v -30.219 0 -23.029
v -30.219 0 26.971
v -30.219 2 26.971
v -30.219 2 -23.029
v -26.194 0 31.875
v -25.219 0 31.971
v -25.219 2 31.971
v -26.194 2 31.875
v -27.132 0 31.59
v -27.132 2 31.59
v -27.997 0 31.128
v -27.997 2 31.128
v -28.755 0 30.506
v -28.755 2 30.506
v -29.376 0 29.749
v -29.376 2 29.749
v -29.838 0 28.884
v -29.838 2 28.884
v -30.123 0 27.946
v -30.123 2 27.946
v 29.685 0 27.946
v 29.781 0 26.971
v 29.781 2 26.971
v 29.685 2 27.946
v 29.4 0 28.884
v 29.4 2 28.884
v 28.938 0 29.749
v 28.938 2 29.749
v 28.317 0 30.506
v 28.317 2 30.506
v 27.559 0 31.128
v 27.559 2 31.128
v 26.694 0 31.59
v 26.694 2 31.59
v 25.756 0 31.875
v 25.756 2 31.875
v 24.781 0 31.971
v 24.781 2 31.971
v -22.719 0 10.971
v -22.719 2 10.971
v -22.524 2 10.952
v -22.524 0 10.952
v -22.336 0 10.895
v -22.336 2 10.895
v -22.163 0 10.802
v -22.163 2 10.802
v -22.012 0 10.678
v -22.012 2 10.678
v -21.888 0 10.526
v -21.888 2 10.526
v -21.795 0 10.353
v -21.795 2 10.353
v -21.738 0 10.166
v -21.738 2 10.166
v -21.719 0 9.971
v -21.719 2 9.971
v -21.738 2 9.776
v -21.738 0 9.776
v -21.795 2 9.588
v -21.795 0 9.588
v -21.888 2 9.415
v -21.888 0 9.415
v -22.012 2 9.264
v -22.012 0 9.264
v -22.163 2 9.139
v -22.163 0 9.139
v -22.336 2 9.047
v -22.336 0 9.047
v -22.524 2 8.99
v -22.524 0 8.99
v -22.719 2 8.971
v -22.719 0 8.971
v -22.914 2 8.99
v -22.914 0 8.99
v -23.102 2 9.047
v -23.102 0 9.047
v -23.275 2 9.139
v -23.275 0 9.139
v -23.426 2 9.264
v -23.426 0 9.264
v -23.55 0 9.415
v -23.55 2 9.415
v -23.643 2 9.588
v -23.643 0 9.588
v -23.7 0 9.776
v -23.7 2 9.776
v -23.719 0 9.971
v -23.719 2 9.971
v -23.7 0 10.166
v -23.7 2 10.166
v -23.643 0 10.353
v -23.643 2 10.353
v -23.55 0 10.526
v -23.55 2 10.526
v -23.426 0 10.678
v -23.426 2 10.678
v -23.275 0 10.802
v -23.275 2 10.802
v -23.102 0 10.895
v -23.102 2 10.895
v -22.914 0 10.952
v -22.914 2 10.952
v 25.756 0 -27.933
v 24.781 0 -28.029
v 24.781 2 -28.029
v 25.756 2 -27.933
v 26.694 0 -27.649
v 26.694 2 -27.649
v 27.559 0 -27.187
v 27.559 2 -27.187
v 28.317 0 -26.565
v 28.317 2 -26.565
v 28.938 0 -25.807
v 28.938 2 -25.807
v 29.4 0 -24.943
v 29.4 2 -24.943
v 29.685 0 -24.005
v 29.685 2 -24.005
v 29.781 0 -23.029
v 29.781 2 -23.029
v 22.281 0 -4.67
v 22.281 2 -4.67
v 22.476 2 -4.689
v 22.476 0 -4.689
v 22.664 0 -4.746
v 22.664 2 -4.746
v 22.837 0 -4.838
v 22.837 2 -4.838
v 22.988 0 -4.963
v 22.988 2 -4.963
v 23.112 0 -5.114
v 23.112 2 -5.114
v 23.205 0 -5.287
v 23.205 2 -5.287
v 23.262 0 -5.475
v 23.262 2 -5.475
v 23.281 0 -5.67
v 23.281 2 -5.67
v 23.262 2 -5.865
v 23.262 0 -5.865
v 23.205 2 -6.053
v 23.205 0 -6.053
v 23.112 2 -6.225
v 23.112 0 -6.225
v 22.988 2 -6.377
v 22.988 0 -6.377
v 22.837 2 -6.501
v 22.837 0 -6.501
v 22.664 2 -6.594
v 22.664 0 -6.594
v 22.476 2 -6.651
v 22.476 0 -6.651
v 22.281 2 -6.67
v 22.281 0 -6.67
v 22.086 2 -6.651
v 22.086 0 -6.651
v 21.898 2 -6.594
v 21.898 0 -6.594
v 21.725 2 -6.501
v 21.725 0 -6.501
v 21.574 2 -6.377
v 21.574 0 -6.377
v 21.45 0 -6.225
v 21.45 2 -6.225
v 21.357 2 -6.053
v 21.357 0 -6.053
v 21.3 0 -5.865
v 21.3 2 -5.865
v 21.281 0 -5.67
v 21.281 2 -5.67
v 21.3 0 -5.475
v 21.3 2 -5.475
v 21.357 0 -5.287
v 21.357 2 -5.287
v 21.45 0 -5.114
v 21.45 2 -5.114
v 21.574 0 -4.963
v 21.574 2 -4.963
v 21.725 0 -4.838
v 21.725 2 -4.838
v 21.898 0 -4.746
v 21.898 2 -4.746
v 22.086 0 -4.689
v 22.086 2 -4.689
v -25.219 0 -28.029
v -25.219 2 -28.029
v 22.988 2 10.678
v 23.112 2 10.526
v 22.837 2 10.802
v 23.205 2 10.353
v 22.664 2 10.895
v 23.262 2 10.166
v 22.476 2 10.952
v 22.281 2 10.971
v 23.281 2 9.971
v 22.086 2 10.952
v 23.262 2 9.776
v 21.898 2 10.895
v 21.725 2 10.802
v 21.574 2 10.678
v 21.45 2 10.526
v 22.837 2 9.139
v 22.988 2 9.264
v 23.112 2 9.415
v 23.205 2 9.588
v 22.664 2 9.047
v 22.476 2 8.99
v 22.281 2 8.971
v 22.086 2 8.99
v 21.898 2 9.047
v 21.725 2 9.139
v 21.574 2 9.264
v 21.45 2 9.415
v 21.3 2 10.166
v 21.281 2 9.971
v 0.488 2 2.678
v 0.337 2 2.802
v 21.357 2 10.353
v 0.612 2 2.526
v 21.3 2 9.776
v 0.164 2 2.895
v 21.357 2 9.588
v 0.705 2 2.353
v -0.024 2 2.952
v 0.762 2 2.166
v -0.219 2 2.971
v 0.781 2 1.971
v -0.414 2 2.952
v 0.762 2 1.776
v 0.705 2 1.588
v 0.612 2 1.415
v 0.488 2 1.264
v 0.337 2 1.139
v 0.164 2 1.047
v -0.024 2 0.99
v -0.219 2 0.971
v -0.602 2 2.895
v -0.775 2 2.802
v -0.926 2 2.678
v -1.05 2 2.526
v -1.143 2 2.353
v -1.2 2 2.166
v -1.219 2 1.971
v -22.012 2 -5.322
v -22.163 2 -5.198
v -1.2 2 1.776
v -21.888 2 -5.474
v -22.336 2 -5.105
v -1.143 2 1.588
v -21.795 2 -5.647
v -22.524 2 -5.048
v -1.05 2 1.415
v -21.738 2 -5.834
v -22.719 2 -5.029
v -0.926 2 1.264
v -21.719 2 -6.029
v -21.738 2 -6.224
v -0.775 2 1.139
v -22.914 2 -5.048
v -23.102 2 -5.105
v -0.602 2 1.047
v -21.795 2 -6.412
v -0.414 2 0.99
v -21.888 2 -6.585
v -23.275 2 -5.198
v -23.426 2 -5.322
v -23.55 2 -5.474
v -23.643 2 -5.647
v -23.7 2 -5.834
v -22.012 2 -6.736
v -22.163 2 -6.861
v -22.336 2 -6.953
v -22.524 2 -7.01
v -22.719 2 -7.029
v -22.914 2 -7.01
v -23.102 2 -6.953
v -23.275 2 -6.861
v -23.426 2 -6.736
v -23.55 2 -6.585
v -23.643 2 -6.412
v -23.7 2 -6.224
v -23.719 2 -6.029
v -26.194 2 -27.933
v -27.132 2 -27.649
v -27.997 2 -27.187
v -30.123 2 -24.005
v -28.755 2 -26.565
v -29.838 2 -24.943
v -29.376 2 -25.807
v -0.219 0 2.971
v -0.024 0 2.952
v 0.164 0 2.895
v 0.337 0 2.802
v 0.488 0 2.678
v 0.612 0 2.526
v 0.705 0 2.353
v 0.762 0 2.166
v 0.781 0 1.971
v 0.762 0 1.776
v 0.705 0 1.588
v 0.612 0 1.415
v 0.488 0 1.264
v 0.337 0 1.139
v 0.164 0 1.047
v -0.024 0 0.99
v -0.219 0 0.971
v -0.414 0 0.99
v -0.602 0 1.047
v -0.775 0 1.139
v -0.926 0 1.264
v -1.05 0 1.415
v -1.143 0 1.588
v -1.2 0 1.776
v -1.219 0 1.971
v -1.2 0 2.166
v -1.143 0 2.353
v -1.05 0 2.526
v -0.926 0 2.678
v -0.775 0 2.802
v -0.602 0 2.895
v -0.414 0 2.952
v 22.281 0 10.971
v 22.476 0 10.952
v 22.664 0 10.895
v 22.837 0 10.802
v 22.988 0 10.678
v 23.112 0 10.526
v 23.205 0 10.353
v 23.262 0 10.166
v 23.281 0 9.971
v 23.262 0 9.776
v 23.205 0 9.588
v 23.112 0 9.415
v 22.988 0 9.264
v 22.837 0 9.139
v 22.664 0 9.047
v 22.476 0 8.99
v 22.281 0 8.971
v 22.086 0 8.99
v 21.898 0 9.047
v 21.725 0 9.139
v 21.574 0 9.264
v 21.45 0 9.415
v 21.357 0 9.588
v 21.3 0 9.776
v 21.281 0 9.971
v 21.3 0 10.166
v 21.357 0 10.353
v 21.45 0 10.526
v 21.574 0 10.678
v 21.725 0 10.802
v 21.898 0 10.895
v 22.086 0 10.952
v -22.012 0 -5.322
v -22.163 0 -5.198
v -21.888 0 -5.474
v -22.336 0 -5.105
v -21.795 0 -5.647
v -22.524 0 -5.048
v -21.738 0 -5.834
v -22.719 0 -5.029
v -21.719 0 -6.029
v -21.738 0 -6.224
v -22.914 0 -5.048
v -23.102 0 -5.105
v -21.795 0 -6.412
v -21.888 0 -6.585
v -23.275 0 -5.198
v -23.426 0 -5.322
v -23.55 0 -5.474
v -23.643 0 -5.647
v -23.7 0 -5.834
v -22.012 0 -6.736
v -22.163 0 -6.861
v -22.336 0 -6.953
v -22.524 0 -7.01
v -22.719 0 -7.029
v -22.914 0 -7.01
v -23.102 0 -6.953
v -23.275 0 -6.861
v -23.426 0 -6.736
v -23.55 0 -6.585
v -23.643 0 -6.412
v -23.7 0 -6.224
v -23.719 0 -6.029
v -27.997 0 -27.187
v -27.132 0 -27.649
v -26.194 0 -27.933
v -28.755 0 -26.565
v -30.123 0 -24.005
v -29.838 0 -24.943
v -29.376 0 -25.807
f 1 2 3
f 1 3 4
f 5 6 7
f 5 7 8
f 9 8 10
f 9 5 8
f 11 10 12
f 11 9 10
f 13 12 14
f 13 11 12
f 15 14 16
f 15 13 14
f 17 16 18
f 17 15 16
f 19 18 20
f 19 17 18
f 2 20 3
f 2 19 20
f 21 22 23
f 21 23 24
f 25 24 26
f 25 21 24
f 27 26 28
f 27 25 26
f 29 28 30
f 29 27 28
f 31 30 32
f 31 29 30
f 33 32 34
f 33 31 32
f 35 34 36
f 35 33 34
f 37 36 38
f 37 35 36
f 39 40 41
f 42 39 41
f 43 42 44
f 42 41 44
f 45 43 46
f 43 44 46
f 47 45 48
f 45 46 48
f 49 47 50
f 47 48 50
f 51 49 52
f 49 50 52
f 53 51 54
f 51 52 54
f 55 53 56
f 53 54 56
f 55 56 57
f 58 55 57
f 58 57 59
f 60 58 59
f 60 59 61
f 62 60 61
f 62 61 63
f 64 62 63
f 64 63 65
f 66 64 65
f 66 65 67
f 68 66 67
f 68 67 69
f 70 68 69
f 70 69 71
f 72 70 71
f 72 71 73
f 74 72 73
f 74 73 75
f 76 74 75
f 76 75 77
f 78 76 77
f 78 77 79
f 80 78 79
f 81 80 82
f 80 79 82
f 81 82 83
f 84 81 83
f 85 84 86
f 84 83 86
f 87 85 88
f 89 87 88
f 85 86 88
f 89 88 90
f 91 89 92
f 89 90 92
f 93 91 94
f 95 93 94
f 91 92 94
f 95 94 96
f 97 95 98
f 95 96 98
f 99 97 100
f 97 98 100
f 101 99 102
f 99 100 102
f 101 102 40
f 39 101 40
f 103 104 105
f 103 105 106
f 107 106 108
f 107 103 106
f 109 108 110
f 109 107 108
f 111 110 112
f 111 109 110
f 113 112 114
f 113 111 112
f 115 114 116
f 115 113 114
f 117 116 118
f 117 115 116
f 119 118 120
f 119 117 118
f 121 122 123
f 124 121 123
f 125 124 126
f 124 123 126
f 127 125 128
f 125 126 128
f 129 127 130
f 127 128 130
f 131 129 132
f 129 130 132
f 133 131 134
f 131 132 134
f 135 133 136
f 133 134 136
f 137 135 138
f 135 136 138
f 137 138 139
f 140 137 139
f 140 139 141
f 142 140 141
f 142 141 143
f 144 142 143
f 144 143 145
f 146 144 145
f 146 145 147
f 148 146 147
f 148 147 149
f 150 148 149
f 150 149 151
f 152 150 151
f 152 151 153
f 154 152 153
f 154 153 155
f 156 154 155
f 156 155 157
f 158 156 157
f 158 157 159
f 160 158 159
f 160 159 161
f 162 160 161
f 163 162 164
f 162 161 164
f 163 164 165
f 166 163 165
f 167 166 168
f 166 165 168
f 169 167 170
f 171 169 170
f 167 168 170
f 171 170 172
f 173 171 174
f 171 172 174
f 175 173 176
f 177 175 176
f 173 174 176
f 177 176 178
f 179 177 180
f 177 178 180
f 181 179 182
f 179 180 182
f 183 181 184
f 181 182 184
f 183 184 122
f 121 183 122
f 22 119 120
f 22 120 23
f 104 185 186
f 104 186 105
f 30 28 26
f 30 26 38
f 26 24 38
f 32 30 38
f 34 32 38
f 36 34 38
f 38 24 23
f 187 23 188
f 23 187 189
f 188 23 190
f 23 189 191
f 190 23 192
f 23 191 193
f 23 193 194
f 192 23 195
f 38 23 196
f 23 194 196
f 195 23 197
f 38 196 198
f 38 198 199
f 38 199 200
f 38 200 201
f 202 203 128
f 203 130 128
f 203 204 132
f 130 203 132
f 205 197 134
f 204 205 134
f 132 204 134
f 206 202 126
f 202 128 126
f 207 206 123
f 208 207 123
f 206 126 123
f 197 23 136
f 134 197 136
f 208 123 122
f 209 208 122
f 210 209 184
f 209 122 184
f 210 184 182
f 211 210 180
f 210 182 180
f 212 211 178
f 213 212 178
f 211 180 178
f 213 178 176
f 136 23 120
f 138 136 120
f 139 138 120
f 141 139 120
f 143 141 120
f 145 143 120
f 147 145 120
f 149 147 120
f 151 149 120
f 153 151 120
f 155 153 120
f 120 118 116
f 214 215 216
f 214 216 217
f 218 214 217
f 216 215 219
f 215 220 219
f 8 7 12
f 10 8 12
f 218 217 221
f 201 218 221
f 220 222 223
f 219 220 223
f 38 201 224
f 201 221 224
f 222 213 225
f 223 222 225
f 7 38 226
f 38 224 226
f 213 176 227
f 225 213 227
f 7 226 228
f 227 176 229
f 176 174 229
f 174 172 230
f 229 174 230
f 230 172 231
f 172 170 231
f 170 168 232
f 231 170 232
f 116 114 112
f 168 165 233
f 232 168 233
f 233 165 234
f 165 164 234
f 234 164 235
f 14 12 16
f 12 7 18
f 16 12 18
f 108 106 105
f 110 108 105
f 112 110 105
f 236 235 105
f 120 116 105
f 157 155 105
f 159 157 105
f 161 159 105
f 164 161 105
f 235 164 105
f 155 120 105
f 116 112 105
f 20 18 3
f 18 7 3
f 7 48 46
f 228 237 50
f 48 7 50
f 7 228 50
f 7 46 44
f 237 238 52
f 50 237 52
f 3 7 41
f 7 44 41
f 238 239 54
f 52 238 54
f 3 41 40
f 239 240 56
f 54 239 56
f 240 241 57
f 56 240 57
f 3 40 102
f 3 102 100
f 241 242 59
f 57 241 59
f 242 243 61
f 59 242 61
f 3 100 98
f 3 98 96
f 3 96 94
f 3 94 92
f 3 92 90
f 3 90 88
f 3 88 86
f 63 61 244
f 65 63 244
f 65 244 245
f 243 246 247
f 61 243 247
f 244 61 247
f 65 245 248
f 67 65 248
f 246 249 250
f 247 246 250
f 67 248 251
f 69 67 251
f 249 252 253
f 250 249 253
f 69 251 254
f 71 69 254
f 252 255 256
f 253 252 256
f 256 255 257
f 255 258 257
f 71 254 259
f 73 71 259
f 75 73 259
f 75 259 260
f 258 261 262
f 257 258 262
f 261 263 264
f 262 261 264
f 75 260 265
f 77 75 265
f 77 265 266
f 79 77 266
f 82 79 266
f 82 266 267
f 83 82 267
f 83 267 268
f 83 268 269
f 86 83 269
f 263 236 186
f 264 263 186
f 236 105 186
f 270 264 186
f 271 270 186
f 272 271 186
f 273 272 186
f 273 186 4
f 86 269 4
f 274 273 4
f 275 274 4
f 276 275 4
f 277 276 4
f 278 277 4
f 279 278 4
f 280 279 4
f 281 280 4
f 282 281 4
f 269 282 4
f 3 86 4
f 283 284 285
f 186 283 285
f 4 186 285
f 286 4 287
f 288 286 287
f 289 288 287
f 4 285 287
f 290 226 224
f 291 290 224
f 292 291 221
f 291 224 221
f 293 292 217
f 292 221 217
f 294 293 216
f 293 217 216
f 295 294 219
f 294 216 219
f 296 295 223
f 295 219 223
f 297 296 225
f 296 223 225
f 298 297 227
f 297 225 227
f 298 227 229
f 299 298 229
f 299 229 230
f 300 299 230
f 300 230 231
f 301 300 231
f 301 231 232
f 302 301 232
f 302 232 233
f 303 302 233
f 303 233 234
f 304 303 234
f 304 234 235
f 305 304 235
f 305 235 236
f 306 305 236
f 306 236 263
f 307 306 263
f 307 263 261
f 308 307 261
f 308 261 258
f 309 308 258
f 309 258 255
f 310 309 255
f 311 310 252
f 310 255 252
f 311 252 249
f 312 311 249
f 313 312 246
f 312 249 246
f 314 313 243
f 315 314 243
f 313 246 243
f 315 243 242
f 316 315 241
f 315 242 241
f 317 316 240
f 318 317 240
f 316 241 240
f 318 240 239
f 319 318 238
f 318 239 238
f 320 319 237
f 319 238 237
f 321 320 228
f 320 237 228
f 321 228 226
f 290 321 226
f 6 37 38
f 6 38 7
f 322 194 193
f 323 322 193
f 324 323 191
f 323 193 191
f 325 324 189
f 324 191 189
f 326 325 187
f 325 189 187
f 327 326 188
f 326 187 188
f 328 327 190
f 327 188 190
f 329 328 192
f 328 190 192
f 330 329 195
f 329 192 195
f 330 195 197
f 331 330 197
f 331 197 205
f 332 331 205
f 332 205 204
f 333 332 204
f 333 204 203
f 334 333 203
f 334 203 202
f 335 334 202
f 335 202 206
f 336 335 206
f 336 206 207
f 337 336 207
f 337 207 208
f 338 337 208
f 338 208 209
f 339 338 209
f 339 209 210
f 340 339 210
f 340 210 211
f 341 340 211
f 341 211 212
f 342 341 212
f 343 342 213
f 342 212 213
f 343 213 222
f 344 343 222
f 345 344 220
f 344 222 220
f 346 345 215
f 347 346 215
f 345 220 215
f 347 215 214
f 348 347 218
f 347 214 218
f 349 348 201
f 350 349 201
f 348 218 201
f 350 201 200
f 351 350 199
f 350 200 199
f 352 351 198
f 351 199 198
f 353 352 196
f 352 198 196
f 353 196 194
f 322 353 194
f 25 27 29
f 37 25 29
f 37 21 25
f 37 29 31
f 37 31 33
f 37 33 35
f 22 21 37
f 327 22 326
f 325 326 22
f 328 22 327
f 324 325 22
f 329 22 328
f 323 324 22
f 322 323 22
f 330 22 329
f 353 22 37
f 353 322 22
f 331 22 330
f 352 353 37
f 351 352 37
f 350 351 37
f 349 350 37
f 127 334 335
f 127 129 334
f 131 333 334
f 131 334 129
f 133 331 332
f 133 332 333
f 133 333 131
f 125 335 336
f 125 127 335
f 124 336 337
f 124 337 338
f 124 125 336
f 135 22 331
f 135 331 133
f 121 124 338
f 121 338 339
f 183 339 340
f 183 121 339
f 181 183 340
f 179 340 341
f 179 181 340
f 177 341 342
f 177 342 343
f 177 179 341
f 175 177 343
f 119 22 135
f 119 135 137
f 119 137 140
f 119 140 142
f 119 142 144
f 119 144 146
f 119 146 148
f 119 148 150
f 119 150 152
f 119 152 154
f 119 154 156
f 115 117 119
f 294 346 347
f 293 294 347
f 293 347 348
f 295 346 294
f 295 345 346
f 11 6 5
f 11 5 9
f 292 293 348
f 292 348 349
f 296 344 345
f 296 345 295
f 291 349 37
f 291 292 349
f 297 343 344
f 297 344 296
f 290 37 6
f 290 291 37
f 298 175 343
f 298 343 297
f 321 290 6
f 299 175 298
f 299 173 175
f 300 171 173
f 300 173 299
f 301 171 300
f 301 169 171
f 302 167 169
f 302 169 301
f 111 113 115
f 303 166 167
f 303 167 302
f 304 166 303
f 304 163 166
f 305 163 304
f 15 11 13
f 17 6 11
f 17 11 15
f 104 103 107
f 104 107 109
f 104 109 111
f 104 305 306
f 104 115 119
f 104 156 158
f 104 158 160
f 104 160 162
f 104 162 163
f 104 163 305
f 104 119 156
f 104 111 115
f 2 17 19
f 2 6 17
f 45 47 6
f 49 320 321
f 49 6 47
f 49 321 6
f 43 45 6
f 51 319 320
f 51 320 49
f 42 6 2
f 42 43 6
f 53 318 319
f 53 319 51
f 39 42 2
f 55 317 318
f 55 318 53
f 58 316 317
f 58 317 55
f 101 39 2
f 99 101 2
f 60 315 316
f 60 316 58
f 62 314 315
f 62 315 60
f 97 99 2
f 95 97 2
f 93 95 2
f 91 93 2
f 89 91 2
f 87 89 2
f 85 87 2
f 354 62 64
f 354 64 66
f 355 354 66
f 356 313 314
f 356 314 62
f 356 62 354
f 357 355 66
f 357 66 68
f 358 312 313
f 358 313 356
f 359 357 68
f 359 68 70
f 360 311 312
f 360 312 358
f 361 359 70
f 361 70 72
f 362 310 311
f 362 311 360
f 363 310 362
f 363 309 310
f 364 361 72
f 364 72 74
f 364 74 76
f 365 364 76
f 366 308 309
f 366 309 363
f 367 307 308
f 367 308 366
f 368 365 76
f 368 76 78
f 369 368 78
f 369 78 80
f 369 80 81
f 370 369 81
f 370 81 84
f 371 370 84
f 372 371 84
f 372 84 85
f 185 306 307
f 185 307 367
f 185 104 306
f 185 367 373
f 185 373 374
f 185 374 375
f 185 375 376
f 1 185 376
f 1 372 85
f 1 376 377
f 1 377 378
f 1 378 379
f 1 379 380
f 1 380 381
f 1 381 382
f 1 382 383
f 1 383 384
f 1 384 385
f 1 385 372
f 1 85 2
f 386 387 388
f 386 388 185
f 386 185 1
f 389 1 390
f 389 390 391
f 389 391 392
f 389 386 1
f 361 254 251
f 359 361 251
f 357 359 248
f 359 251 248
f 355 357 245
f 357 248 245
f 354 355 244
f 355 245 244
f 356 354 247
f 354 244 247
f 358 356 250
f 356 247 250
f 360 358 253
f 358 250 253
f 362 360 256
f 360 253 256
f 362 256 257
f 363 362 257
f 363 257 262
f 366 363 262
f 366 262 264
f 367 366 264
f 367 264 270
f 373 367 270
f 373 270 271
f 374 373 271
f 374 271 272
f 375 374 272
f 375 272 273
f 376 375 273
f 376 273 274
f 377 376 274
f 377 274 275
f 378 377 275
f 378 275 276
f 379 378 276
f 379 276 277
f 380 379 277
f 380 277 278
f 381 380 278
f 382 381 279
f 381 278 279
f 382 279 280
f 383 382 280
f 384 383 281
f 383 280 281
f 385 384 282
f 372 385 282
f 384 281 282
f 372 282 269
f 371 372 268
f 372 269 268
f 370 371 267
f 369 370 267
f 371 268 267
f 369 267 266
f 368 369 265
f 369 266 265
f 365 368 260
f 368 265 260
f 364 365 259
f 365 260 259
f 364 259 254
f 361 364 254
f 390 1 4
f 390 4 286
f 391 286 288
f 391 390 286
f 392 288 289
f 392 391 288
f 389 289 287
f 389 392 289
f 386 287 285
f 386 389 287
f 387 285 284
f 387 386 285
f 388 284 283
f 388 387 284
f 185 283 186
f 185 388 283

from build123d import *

# Parameters (mm, degrees)
BOSS_EXTRUDE1_DEPTH = 2
SKETCH2_R           = 1
CUT_EXTRUDE1_DEPTH  = 3


with BuildPart() as part:
    # Sketch1 → Boss-Extrude1 (new body)
    with BuildSketch(Plane(origin=(0, 0, 0), x_dir=(1, 0, 0), z_dir=(0, 1, 0))):
        with BuildLine():
            Line((-25.218978102, 28.02919708), (24.781021898, 28.02919708))
            ThreePointArc((24.781021898, 28.02919708), (28.316555804, 26.564730986), (29.781021898, 23.02919708))
            Line((29.781021898, 23.02919708), (29.781021898, -26.97080292))
            ThreePointArc((29.781021898, -26.97080292), (28.316555804, -30.506336826), (24.781021898, -31.97080292))
            Line((24.781021898, -31.97080292), (-25.218978102, -31.97080292))
            ThreePointArc((-25.218978102, -31.97080292), (-28.754512008, -30.506336826), (-30.218978102, -26.97080292))
            Line((-30.218978102, -26.97080292), (-30.218978102, 23.02919708))
            ThreePointArc((-30.218978102, 23.02919708), (-28.754512008, 26.564730986), (-25.218978102, 28.02919708))
        make_face()
    extrude(amount=BOSS_EXTRUDE1_DEPTH)

    # Sketch2 → Cut-Extrude1 (cut)
    with BuildSketch(Plane(origin=(0, 2, 0), x_dir=(1, 0, 0), z_dir=(0, 1, 0))):
        with Locations(Location((-22.718978102, 6.02919708, 0), (0, 0, 270))):
            Circle(SKETCH2_R)
        with Locations(Location((-22.718978102, -9.97080292, 0), (0, 0, 270))):
            Circle(SKETCH2_R)
        with Locations(Location((22.281021898, 5.669895239, 0), (0, 0, 270))):
            Circle(SKETCH2_R)
        with Locations(Location((22.281021898, -9.97080292, 0), (0, 0, 270))):
            Circle(SKETCH2_R)
        with Locations(Location((-0.218978102, -1.97080292, 0), (0, 0, 270))):
            Circle(SKETCH2_R)
    extrude(amount=-CUT_EXTRUDE1_DEPTH, mode=Mode.SUBTRACT)


solid = part.part
